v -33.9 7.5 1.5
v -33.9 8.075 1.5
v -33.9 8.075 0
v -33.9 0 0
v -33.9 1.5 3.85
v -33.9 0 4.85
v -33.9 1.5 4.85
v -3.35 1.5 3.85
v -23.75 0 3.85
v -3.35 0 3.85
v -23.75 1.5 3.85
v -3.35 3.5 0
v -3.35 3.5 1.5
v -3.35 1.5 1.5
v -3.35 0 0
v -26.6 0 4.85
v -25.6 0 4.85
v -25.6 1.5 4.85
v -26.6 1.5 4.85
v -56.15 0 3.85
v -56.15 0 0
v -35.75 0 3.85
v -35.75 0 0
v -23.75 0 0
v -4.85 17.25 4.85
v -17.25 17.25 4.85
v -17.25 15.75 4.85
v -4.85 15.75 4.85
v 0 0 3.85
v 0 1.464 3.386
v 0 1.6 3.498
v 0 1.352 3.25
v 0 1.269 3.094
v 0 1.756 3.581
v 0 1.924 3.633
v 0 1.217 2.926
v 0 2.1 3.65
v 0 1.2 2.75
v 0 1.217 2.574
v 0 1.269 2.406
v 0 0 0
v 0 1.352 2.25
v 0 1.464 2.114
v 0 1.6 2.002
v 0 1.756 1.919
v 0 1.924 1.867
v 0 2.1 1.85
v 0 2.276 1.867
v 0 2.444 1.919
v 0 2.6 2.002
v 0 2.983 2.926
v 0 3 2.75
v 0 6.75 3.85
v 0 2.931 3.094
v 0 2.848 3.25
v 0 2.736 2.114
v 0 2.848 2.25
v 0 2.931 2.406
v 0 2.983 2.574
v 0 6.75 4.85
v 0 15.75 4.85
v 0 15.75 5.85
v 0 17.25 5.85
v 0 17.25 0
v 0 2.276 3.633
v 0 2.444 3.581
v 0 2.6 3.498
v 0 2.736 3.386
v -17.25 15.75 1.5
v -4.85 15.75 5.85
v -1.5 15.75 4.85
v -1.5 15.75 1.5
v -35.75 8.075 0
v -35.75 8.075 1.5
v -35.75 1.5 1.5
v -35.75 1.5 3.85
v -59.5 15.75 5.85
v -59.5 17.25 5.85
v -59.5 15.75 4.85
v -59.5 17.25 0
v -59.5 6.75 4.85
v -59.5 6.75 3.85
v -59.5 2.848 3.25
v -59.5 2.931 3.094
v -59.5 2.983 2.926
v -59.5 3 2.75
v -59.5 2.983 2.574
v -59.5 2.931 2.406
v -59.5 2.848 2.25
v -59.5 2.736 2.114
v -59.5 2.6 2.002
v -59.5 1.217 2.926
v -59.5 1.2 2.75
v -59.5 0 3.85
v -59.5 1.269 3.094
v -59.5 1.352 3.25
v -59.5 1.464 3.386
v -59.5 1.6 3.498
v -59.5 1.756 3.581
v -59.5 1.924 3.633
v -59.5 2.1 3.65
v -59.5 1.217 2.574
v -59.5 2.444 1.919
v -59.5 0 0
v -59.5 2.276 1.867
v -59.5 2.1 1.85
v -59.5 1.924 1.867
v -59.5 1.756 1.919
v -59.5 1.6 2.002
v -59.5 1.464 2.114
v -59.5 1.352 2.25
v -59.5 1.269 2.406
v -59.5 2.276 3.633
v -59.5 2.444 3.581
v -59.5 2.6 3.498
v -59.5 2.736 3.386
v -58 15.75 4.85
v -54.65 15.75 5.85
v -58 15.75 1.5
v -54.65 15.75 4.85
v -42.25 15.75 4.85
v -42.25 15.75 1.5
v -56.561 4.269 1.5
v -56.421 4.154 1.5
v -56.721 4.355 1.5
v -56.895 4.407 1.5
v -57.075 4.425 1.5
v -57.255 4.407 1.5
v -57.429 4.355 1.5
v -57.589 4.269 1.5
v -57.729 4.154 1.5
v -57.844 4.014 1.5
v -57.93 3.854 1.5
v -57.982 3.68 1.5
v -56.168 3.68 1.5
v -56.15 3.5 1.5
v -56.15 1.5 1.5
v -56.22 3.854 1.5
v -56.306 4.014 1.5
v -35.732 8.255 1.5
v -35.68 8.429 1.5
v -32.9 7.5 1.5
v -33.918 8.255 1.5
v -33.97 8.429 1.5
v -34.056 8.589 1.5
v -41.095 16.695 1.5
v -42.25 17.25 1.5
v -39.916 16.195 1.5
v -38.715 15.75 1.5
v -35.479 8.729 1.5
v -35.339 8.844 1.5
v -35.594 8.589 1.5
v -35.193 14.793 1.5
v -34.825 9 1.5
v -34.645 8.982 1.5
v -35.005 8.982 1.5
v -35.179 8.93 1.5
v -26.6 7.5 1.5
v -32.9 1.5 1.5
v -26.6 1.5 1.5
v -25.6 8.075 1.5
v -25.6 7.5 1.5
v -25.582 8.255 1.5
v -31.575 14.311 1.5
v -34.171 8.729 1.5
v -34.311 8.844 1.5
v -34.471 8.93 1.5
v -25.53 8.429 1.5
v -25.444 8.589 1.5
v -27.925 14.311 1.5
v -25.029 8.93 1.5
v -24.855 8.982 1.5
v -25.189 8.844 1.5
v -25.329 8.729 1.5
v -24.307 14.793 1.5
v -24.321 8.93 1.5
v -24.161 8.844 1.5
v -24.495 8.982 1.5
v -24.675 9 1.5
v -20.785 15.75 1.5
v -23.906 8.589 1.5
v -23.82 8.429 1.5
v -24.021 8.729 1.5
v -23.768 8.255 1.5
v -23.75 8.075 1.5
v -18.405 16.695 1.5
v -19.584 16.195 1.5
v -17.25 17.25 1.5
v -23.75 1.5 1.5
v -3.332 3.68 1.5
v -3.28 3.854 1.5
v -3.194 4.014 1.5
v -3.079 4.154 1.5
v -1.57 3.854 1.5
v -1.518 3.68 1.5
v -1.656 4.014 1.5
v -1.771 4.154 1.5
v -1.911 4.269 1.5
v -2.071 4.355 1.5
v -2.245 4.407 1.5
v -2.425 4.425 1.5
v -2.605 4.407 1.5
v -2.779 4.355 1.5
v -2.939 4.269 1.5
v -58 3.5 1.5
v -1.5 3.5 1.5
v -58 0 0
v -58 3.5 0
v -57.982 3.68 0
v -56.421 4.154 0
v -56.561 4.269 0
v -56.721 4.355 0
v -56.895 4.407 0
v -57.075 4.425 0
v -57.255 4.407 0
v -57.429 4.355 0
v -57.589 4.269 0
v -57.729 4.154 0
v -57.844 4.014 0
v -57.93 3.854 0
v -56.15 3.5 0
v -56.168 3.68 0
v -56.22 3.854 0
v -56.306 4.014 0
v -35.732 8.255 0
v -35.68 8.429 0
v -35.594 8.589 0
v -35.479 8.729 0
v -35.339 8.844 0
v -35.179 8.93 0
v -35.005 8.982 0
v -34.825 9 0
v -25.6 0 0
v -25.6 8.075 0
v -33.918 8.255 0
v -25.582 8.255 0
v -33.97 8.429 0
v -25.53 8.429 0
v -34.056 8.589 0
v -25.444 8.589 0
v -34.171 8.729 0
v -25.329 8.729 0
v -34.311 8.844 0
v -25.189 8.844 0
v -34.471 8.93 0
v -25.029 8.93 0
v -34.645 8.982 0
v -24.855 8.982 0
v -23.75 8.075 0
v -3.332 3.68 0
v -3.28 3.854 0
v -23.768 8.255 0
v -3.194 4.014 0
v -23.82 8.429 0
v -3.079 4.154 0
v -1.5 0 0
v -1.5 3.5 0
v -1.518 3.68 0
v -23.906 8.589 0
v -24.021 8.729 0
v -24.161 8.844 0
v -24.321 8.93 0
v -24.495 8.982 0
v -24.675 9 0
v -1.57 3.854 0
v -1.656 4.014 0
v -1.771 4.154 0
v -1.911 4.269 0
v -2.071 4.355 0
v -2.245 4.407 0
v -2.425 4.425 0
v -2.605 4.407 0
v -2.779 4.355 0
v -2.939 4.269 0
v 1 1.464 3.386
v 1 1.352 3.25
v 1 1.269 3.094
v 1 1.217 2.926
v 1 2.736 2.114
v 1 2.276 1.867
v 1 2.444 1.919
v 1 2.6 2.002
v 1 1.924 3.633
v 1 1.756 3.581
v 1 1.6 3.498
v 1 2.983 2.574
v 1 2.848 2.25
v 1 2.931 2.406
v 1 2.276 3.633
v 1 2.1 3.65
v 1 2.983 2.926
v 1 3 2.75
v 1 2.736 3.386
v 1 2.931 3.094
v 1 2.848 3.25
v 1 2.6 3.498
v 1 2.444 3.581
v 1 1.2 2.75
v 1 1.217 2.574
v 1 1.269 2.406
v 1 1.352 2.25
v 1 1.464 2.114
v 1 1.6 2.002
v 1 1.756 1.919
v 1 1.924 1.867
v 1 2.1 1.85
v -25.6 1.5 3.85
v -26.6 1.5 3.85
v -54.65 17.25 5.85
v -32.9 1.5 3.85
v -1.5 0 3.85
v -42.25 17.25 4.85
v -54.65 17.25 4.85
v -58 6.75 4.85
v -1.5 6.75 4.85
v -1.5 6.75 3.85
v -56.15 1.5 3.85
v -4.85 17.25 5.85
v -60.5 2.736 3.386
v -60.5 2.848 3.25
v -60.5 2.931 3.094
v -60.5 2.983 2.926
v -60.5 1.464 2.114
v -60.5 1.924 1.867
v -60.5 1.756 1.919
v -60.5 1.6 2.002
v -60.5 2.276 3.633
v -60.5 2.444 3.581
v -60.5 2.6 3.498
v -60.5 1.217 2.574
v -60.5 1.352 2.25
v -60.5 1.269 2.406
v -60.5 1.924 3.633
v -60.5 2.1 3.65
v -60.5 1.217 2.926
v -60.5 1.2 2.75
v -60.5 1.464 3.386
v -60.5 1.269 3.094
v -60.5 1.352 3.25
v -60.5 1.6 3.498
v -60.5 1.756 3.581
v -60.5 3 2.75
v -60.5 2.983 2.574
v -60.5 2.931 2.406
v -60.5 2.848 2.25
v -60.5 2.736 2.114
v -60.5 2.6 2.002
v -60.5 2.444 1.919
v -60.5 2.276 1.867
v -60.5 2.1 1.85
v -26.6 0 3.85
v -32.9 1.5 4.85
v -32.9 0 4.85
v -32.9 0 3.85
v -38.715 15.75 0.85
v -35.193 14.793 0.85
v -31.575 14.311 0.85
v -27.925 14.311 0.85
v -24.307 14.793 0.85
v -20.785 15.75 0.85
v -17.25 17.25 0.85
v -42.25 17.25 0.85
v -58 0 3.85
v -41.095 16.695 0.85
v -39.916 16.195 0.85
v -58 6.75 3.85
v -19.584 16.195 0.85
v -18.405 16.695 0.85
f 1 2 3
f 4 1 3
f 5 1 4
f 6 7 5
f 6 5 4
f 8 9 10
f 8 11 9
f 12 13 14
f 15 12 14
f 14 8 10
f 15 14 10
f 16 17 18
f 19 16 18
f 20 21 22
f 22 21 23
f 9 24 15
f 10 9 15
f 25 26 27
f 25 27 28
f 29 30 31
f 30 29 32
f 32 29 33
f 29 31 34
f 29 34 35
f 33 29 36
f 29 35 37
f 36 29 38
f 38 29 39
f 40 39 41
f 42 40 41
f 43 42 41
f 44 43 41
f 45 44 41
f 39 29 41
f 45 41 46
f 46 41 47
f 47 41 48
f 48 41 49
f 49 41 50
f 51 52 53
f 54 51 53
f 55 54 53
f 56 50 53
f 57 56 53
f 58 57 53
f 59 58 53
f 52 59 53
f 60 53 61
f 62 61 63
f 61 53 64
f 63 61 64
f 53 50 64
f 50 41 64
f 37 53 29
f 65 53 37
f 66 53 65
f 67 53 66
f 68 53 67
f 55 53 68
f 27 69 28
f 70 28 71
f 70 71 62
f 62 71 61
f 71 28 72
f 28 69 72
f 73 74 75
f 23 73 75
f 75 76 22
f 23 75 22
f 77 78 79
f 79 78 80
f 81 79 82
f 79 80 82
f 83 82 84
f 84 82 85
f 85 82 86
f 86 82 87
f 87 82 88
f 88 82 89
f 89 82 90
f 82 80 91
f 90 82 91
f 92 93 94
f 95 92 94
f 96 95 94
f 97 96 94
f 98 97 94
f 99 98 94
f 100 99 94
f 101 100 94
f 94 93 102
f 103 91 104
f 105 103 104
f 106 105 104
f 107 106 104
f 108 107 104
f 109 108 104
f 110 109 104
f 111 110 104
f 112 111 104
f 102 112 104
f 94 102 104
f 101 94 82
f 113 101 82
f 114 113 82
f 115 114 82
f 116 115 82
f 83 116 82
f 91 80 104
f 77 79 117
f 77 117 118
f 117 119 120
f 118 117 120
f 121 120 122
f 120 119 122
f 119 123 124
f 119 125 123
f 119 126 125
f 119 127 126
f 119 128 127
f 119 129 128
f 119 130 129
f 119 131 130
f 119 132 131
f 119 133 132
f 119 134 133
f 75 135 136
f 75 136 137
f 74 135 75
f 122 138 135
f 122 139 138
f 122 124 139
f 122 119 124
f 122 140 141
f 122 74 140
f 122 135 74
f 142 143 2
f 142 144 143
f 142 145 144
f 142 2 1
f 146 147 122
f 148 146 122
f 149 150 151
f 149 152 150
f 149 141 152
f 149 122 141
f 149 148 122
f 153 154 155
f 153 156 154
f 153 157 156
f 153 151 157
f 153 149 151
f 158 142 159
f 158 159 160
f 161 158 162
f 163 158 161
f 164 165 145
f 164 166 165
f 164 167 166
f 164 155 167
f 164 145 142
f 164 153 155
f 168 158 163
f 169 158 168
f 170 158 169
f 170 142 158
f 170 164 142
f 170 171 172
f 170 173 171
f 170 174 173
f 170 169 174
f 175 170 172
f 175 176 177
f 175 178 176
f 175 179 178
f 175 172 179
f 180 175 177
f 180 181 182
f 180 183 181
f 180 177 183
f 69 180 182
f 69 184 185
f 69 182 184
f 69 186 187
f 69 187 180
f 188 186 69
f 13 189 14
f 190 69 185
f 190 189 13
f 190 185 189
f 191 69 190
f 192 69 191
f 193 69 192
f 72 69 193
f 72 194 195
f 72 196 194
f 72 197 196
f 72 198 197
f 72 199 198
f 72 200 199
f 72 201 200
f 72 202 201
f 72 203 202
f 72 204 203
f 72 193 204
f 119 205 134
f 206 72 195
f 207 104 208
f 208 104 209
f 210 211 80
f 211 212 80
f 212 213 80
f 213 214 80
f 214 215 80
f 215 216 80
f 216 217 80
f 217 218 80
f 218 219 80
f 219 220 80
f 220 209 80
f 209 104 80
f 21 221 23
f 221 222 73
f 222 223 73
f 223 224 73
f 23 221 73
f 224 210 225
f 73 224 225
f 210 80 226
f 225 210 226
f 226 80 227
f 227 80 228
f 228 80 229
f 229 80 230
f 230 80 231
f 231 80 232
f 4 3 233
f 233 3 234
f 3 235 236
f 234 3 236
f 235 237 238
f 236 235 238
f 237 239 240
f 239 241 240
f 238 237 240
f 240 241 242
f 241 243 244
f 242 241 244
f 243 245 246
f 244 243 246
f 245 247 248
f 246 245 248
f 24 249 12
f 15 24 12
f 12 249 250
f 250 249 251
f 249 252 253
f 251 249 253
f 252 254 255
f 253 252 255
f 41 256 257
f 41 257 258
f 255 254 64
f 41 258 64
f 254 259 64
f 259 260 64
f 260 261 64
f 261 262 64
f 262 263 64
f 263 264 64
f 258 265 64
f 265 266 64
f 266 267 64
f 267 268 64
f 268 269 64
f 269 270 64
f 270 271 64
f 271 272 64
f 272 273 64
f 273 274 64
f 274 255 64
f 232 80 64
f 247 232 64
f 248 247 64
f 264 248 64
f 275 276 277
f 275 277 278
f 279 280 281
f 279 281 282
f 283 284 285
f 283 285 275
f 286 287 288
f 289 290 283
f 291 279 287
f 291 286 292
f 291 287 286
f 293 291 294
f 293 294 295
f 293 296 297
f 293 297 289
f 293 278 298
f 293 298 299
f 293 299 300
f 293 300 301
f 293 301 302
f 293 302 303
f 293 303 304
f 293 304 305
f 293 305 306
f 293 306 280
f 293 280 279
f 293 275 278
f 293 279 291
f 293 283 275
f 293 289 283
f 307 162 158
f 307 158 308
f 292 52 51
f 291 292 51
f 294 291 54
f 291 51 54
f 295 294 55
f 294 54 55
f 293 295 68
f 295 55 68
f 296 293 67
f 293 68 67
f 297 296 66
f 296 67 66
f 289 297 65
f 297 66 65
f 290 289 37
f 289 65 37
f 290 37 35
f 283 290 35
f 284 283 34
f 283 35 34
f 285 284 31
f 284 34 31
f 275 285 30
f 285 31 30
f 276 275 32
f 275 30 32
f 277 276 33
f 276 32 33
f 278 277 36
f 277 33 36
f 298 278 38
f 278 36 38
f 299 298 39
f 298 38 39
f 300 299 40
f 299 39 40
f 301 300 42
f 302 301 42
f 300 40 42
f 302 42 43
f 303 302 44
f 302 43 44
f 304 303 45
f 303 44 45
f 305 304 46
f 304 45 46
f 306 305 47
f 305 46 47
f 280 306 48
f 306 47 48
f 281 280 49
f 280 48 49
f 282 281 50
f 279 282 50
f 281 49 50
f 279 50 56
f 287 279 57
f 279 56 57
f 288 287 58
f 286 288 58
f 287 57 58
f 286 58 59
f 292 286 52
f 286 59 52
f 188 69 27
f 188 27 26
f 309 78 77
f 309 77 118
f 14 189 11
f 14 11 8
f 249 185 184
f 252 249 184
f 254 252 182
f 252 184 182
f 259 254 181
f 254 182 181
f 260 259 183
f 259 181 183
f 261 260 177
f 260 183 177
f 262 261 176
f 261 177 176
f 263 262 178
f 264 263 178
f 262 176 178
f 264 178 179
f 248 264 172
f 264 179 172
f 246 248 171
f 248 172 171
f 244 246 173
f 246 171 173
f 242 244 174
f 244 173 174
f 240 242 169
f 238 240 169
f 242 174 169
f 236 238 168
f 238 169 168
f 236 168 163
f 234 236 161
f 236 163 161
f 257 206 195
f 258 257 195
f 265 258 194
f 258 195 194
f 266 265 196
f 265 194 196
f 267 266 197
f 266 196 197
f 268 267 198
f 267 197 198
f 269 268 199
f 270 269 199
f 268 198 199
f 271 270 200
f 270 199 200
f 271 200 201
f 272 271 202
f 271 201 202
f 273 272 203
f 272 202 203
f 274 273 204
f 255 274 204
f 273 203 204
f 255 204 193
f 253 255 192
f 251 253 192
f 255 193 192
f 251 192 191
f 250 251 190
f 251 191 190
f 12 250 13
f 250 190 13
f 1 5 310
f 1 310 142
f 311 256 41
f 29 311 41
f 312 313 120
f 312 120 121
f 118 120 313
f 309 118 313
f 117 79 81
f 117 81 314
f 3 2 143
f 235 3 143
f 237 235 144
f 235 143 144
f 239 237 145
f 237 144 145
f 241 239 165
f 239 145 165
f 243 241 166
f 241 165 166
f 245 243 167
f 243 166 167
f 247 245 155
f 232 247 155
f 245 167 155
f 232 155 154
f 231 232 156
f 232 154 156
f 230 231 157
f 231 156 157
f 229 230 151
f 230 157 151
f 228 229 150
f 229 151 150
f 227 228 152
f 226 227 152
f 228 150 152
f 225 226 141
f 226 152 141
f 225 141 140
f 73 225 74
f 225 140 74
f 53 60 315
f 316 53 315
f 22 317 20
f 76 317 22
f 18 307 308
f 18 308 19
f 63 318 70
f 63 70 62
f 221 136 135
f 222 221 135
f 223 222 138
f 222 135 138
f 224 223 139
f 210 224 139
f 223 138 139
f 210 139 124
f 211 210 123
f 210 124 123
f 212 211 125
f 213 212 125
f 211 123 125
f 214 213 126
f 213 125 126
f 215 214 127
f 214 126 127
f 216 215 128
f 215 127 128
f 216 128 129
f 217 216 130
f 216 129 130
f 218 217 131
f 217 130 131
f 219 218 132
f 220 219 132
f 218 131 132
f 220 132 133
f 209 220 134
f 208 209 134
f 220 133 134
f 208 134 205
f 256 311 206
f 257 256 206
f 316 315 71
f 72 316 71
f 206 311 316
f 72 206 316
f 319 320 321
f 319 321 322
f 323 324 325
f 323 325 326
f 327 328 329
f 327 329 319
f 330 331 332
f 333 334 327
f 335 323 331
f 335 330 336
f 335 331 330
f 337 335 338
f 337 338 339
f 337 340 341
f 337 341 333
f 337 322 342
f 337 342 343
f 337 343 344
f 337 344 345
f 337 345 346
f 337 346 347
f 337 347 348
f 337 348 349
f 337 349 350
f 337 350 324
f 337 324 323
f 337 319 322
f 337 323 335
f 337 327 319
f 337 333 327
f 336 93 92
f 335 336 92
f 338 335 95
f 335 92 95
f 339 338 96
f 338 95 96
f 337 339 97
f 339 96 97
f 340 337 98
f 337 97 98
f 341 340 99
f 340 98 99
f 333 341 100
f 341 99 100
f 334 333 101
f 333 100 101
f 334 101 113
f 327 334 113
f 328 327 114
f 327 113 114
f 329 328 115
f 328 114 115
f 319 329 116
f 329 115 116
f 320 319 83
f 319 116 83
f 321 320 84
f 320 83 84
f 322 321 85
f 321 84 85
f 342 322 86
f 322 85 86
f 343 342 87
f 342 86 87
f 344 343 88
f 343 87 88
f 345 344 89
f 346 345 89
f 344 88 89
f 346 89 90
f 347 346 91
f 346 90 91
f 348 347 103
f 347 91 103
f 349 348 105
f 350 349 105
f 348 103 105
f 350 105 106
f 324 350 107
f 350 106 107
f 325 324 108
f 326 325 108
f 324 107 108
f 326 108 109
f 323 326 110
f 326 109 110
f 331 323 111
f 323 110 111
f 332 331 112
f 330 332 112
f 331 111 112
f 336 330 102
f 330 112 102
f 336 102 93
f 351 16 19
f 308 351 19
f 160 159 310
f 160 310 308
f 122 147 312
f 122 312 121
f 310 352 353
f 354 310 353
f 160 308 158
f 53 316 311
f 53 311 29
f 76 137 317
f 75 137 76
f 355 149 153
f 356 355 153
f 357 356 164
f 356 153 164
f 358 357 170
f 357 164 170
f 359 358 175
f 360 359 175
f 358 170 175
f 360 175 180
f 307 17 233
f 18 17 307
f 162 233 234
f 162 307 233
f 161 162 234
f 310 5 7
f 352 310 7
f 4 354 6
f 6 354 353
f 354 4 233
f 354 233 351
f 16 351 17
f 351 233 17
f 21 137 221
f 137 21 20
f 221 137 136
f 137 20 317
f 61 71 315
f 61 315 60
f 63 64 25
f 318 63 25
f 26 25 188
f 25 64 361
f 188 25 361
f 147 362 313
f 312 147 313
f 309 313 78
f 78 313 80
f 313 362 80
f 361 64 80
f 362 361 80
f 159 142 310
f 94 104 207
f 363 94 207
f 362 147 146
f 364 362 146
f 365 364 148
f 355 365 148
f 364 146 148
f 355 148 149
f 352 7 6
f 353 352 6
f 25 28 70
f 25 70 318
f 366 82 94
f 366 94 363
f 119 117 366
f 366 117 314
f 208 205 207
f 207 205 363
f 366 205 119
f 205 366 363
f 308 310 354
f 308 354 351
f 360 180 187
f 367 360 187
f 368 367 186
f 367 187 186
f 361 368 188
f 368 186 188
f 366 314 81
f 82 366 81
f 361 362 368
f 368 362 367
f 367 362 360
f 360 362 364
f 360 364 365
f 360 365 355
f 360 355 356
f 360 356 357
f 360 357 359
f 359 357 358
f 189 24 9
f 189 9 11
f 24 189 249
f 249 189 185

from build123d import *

# Parameters (mm, degrees)
F0_W      = 59.5
F0_H      = 17.25
F1_DEPTH  = 4.85
F2_T      = -1.5
F3_W      = 1.85
F3_H      = 1.5
F4_DEPTH  = 4.851
F6_DEPTH  = 4
F8_DEPTH  = 3.351
F9_W      = 1.5
F9_H      = 6.75
F10_DEPTH = 1
F11_W     = 4.85
F11_H     = 1.5
F12_DEPTH = 1
F13_W     = 1.5
F13_H     = 1
F14_DEPTH = 1
F15_W     = 1.5
F15_H     = 1
F16_DEPTH = 1
F17_R     = 0.9
F18_DEPTH = 1
F19_R     = 0.9
F20_DEPTH = 1


with BuildPart() as f1:
    # F0 (on Top) → F1 (new body)
    with BuildSketch(Plane.XY):
        with Locations((-29.75, 8.625)):
            Rectangle(F0_W, F0_H)
    extrude(amount=F1_DEPTH)

    # F2
    f2_openings = [f1.faces().sort_by_distance(p)[0] for p in [
        (-29.75, 8.625, 4.85),
    ]]
    offset(amount=F2_T, openings=f2_openings)

    # F3 (on face) → F4 (cut, through all)
    with BuildSketch(Plane.XY.offset(4.85)):
        with BuildLine():
            Line((-35.75, 8.075), (-35.75, 1.5))
            Line((-35.75, 1.5), (-33.9, 1.5))
            Line((-33.9, 1.5), (-33.9, 8.075))
            ThreePointArc((-33.9, 8.075), (-34.825, 9), (-35.75, 8.075))
        make_face()
        with Locations((-34.825, 0.75)):
            Rectangle(F3_W, F3_H)
        with BuildLine():
            Line((-58, 1.5), (-56.15, 1.5))
            Line((-56.15, 1.5), (-56.15, 3.5))
            ThreePointArc((-56.15, 3.5), (-57.075, 4.425), (-58, 3.5))
            Line((-58, 3.5), (-58, 1.5))
        make_face()
        with Locations((-57.075, 0.75)):
            Rectangle(F3_W, F3_H)
        with BuildLine():
            Line((-25.6, 8.075), (-25.6, 1.5))
            Line((-25.6, 1.5), (-23.75, 1.5))
            Line((-23.75, 1.5), (-23.75, 8.075))
            ThreePointArc((-23.75, 8.075), (-24.675, 9), (-25.6, 8.075))
        make_face()
        with Locations((-24.675, 0.75)):
            Rectangle(F3_W, F3_H)
        with BuildLine():
            Line((-1.5, 1.5), (-1.5, 3.5))
            ThreePointArc((-1.5, 3.5), (-2.425, 4.425), (-3.35, 3.5))
            Line((-3.35, 3.5), (-3.35, 1.5))
            Line((-3.35, 1.5), (-1.5, 1.5))
        make_face()
        with Locations((-2.425, 0.75)):
            Rectangle(F3_W, F3_H)
    extrude(amount=-F4_DEPTH, mode=Mode.SUBTRACT)

    # F5 (on face) → F6 (cut)
    with BuildSketch(Plane.XY.offset(4.85)):
        with BuildLine():
            Line((-20.7847894615, 15.75), (-38.7152105385, 15.75))
            ThreePointArc((-38.7152105385, 15.75), (-29.75, 14.25), (-20.7847894615, 15.75))
        make_face()
        with BuildLine():
            Line((-17.25, 17.25), (-42.25, 17.25))
            ThreePointArc((-42.25, 17.25), (-40.508778549, 16.4383219778), (-38.7152105385, 15.75))
            Line((-38.7152105385, 15.75), (-20.7847894615, 15.75))
            ThreePointArc((-20.7847894615, 15.75), (-18.991221451, 16.4383219778), (-17.25, 17.25))
        make_face()
    extrude(amount=-F6_DEPTH, mode=Mode.SUBTRACT)

    # F7 (on face) → F8 (cut, through all)
    with BuildSketch(Plane.XY.offset(1.5)):
        with BuildLine():
            Line((-42.25, 17.25), (-42.25, 15.75))
            Line((-42.25, 15.75), (-38.7152105385, 15.75))
            ThreePointArc((-38.7152105385, 15.75), (-40.508778549, 16.4383219778), (-42.25, 17.25))
        make_face()
        with BuildLine():
            ThreePointArc((-17.25, 17.25), (-18.991221451, 16.4383219778), (-20.7847894615, 15.75))
            Line((-20.7847894615, 15.75), (-17.25, 15.75))
            Line((-17.25, 15.75), (-17.25, 17.25))
        make_face()
    extrude(amount=F8_DEPTH, mode=Mode.SUBTRACT)

    # F9 (on face) → F10 (cut)
    with BuildSketch(Plane.XY.offset(4.85)):
        with Locations((-58.75, 3.375)):
            Rectangle(F9_W, F9_H)
        Polygon((-59.5, 6.75), (-60.5477912843, 6.75), (-60.5477912843, -8.7434453119), (1.7196297206, -8.7434453119), (1.7196297206, 6.75), (-58, 6.75), (-58, 0), (-59.5, 0), align=None)
    extrude(amount=-F10_DEPTH, mode=Mode.SUBTRACT)

    # F11 (on face) → F12 (join)
    with BuildSketch(Plane.XY.offset(4.85)):
        Polygon((-54.65, 17.25), (-59.5, 17.25), (-59.5, 15.75), (-58, 15.75), (-54.65, 15.75), align=None)
        with Locations((-2.425, 16.5)):
            Rectangle(F11_W, F11_H)
    extrude(amount=F12_DEPTH)

    # F13 (on face) → F14 (join)
    with BuildSketch(Plane(origin=(-33.9, 0, 0), x_dir=(0, -1, 0), z_dir=(-1, 0, 0))):
        Polygon((-1.5, 1.5), (-1.5, 3.85), (-7.5, 1.5), align=None)
        with Locations((-0.75, 4.35)):
            Rectangle(F13_W, F13_H)
    extrude(amount=-F14_DEPTH)

    # F15 (on face) → F16 (join)
    with BuildSketch(Plane.YZ.offset(-25.6)):
        with Locations((0.75, 4.35)):
            Rectangle(F15_W, F15_H)
        Polygon((7.5, 1.5), (1.5, 3.85), (1.5, 1.5), align=None)
    extrude(amount=-F16_DEPTH)

    # F17 (on face) → F18 (join)
    with BuildSketch(Plane.YZ):
        with Locations((2.1, 2.75)):
            Circle(F17_R)
    extrude(amount=F18_DEPTH)

    # F19 (on face) → F20 (join)
    with BuildSketch(Plane(origin=(-59.5, 0, 0), x_dir=(0, -1, 0), z_dir=(-1, 0, 0))):
        with Locations((-2.1, 2.75)):
            Circle(F19_R)
    extrude(amount=F20_DEPTH)


solid = f1.part
